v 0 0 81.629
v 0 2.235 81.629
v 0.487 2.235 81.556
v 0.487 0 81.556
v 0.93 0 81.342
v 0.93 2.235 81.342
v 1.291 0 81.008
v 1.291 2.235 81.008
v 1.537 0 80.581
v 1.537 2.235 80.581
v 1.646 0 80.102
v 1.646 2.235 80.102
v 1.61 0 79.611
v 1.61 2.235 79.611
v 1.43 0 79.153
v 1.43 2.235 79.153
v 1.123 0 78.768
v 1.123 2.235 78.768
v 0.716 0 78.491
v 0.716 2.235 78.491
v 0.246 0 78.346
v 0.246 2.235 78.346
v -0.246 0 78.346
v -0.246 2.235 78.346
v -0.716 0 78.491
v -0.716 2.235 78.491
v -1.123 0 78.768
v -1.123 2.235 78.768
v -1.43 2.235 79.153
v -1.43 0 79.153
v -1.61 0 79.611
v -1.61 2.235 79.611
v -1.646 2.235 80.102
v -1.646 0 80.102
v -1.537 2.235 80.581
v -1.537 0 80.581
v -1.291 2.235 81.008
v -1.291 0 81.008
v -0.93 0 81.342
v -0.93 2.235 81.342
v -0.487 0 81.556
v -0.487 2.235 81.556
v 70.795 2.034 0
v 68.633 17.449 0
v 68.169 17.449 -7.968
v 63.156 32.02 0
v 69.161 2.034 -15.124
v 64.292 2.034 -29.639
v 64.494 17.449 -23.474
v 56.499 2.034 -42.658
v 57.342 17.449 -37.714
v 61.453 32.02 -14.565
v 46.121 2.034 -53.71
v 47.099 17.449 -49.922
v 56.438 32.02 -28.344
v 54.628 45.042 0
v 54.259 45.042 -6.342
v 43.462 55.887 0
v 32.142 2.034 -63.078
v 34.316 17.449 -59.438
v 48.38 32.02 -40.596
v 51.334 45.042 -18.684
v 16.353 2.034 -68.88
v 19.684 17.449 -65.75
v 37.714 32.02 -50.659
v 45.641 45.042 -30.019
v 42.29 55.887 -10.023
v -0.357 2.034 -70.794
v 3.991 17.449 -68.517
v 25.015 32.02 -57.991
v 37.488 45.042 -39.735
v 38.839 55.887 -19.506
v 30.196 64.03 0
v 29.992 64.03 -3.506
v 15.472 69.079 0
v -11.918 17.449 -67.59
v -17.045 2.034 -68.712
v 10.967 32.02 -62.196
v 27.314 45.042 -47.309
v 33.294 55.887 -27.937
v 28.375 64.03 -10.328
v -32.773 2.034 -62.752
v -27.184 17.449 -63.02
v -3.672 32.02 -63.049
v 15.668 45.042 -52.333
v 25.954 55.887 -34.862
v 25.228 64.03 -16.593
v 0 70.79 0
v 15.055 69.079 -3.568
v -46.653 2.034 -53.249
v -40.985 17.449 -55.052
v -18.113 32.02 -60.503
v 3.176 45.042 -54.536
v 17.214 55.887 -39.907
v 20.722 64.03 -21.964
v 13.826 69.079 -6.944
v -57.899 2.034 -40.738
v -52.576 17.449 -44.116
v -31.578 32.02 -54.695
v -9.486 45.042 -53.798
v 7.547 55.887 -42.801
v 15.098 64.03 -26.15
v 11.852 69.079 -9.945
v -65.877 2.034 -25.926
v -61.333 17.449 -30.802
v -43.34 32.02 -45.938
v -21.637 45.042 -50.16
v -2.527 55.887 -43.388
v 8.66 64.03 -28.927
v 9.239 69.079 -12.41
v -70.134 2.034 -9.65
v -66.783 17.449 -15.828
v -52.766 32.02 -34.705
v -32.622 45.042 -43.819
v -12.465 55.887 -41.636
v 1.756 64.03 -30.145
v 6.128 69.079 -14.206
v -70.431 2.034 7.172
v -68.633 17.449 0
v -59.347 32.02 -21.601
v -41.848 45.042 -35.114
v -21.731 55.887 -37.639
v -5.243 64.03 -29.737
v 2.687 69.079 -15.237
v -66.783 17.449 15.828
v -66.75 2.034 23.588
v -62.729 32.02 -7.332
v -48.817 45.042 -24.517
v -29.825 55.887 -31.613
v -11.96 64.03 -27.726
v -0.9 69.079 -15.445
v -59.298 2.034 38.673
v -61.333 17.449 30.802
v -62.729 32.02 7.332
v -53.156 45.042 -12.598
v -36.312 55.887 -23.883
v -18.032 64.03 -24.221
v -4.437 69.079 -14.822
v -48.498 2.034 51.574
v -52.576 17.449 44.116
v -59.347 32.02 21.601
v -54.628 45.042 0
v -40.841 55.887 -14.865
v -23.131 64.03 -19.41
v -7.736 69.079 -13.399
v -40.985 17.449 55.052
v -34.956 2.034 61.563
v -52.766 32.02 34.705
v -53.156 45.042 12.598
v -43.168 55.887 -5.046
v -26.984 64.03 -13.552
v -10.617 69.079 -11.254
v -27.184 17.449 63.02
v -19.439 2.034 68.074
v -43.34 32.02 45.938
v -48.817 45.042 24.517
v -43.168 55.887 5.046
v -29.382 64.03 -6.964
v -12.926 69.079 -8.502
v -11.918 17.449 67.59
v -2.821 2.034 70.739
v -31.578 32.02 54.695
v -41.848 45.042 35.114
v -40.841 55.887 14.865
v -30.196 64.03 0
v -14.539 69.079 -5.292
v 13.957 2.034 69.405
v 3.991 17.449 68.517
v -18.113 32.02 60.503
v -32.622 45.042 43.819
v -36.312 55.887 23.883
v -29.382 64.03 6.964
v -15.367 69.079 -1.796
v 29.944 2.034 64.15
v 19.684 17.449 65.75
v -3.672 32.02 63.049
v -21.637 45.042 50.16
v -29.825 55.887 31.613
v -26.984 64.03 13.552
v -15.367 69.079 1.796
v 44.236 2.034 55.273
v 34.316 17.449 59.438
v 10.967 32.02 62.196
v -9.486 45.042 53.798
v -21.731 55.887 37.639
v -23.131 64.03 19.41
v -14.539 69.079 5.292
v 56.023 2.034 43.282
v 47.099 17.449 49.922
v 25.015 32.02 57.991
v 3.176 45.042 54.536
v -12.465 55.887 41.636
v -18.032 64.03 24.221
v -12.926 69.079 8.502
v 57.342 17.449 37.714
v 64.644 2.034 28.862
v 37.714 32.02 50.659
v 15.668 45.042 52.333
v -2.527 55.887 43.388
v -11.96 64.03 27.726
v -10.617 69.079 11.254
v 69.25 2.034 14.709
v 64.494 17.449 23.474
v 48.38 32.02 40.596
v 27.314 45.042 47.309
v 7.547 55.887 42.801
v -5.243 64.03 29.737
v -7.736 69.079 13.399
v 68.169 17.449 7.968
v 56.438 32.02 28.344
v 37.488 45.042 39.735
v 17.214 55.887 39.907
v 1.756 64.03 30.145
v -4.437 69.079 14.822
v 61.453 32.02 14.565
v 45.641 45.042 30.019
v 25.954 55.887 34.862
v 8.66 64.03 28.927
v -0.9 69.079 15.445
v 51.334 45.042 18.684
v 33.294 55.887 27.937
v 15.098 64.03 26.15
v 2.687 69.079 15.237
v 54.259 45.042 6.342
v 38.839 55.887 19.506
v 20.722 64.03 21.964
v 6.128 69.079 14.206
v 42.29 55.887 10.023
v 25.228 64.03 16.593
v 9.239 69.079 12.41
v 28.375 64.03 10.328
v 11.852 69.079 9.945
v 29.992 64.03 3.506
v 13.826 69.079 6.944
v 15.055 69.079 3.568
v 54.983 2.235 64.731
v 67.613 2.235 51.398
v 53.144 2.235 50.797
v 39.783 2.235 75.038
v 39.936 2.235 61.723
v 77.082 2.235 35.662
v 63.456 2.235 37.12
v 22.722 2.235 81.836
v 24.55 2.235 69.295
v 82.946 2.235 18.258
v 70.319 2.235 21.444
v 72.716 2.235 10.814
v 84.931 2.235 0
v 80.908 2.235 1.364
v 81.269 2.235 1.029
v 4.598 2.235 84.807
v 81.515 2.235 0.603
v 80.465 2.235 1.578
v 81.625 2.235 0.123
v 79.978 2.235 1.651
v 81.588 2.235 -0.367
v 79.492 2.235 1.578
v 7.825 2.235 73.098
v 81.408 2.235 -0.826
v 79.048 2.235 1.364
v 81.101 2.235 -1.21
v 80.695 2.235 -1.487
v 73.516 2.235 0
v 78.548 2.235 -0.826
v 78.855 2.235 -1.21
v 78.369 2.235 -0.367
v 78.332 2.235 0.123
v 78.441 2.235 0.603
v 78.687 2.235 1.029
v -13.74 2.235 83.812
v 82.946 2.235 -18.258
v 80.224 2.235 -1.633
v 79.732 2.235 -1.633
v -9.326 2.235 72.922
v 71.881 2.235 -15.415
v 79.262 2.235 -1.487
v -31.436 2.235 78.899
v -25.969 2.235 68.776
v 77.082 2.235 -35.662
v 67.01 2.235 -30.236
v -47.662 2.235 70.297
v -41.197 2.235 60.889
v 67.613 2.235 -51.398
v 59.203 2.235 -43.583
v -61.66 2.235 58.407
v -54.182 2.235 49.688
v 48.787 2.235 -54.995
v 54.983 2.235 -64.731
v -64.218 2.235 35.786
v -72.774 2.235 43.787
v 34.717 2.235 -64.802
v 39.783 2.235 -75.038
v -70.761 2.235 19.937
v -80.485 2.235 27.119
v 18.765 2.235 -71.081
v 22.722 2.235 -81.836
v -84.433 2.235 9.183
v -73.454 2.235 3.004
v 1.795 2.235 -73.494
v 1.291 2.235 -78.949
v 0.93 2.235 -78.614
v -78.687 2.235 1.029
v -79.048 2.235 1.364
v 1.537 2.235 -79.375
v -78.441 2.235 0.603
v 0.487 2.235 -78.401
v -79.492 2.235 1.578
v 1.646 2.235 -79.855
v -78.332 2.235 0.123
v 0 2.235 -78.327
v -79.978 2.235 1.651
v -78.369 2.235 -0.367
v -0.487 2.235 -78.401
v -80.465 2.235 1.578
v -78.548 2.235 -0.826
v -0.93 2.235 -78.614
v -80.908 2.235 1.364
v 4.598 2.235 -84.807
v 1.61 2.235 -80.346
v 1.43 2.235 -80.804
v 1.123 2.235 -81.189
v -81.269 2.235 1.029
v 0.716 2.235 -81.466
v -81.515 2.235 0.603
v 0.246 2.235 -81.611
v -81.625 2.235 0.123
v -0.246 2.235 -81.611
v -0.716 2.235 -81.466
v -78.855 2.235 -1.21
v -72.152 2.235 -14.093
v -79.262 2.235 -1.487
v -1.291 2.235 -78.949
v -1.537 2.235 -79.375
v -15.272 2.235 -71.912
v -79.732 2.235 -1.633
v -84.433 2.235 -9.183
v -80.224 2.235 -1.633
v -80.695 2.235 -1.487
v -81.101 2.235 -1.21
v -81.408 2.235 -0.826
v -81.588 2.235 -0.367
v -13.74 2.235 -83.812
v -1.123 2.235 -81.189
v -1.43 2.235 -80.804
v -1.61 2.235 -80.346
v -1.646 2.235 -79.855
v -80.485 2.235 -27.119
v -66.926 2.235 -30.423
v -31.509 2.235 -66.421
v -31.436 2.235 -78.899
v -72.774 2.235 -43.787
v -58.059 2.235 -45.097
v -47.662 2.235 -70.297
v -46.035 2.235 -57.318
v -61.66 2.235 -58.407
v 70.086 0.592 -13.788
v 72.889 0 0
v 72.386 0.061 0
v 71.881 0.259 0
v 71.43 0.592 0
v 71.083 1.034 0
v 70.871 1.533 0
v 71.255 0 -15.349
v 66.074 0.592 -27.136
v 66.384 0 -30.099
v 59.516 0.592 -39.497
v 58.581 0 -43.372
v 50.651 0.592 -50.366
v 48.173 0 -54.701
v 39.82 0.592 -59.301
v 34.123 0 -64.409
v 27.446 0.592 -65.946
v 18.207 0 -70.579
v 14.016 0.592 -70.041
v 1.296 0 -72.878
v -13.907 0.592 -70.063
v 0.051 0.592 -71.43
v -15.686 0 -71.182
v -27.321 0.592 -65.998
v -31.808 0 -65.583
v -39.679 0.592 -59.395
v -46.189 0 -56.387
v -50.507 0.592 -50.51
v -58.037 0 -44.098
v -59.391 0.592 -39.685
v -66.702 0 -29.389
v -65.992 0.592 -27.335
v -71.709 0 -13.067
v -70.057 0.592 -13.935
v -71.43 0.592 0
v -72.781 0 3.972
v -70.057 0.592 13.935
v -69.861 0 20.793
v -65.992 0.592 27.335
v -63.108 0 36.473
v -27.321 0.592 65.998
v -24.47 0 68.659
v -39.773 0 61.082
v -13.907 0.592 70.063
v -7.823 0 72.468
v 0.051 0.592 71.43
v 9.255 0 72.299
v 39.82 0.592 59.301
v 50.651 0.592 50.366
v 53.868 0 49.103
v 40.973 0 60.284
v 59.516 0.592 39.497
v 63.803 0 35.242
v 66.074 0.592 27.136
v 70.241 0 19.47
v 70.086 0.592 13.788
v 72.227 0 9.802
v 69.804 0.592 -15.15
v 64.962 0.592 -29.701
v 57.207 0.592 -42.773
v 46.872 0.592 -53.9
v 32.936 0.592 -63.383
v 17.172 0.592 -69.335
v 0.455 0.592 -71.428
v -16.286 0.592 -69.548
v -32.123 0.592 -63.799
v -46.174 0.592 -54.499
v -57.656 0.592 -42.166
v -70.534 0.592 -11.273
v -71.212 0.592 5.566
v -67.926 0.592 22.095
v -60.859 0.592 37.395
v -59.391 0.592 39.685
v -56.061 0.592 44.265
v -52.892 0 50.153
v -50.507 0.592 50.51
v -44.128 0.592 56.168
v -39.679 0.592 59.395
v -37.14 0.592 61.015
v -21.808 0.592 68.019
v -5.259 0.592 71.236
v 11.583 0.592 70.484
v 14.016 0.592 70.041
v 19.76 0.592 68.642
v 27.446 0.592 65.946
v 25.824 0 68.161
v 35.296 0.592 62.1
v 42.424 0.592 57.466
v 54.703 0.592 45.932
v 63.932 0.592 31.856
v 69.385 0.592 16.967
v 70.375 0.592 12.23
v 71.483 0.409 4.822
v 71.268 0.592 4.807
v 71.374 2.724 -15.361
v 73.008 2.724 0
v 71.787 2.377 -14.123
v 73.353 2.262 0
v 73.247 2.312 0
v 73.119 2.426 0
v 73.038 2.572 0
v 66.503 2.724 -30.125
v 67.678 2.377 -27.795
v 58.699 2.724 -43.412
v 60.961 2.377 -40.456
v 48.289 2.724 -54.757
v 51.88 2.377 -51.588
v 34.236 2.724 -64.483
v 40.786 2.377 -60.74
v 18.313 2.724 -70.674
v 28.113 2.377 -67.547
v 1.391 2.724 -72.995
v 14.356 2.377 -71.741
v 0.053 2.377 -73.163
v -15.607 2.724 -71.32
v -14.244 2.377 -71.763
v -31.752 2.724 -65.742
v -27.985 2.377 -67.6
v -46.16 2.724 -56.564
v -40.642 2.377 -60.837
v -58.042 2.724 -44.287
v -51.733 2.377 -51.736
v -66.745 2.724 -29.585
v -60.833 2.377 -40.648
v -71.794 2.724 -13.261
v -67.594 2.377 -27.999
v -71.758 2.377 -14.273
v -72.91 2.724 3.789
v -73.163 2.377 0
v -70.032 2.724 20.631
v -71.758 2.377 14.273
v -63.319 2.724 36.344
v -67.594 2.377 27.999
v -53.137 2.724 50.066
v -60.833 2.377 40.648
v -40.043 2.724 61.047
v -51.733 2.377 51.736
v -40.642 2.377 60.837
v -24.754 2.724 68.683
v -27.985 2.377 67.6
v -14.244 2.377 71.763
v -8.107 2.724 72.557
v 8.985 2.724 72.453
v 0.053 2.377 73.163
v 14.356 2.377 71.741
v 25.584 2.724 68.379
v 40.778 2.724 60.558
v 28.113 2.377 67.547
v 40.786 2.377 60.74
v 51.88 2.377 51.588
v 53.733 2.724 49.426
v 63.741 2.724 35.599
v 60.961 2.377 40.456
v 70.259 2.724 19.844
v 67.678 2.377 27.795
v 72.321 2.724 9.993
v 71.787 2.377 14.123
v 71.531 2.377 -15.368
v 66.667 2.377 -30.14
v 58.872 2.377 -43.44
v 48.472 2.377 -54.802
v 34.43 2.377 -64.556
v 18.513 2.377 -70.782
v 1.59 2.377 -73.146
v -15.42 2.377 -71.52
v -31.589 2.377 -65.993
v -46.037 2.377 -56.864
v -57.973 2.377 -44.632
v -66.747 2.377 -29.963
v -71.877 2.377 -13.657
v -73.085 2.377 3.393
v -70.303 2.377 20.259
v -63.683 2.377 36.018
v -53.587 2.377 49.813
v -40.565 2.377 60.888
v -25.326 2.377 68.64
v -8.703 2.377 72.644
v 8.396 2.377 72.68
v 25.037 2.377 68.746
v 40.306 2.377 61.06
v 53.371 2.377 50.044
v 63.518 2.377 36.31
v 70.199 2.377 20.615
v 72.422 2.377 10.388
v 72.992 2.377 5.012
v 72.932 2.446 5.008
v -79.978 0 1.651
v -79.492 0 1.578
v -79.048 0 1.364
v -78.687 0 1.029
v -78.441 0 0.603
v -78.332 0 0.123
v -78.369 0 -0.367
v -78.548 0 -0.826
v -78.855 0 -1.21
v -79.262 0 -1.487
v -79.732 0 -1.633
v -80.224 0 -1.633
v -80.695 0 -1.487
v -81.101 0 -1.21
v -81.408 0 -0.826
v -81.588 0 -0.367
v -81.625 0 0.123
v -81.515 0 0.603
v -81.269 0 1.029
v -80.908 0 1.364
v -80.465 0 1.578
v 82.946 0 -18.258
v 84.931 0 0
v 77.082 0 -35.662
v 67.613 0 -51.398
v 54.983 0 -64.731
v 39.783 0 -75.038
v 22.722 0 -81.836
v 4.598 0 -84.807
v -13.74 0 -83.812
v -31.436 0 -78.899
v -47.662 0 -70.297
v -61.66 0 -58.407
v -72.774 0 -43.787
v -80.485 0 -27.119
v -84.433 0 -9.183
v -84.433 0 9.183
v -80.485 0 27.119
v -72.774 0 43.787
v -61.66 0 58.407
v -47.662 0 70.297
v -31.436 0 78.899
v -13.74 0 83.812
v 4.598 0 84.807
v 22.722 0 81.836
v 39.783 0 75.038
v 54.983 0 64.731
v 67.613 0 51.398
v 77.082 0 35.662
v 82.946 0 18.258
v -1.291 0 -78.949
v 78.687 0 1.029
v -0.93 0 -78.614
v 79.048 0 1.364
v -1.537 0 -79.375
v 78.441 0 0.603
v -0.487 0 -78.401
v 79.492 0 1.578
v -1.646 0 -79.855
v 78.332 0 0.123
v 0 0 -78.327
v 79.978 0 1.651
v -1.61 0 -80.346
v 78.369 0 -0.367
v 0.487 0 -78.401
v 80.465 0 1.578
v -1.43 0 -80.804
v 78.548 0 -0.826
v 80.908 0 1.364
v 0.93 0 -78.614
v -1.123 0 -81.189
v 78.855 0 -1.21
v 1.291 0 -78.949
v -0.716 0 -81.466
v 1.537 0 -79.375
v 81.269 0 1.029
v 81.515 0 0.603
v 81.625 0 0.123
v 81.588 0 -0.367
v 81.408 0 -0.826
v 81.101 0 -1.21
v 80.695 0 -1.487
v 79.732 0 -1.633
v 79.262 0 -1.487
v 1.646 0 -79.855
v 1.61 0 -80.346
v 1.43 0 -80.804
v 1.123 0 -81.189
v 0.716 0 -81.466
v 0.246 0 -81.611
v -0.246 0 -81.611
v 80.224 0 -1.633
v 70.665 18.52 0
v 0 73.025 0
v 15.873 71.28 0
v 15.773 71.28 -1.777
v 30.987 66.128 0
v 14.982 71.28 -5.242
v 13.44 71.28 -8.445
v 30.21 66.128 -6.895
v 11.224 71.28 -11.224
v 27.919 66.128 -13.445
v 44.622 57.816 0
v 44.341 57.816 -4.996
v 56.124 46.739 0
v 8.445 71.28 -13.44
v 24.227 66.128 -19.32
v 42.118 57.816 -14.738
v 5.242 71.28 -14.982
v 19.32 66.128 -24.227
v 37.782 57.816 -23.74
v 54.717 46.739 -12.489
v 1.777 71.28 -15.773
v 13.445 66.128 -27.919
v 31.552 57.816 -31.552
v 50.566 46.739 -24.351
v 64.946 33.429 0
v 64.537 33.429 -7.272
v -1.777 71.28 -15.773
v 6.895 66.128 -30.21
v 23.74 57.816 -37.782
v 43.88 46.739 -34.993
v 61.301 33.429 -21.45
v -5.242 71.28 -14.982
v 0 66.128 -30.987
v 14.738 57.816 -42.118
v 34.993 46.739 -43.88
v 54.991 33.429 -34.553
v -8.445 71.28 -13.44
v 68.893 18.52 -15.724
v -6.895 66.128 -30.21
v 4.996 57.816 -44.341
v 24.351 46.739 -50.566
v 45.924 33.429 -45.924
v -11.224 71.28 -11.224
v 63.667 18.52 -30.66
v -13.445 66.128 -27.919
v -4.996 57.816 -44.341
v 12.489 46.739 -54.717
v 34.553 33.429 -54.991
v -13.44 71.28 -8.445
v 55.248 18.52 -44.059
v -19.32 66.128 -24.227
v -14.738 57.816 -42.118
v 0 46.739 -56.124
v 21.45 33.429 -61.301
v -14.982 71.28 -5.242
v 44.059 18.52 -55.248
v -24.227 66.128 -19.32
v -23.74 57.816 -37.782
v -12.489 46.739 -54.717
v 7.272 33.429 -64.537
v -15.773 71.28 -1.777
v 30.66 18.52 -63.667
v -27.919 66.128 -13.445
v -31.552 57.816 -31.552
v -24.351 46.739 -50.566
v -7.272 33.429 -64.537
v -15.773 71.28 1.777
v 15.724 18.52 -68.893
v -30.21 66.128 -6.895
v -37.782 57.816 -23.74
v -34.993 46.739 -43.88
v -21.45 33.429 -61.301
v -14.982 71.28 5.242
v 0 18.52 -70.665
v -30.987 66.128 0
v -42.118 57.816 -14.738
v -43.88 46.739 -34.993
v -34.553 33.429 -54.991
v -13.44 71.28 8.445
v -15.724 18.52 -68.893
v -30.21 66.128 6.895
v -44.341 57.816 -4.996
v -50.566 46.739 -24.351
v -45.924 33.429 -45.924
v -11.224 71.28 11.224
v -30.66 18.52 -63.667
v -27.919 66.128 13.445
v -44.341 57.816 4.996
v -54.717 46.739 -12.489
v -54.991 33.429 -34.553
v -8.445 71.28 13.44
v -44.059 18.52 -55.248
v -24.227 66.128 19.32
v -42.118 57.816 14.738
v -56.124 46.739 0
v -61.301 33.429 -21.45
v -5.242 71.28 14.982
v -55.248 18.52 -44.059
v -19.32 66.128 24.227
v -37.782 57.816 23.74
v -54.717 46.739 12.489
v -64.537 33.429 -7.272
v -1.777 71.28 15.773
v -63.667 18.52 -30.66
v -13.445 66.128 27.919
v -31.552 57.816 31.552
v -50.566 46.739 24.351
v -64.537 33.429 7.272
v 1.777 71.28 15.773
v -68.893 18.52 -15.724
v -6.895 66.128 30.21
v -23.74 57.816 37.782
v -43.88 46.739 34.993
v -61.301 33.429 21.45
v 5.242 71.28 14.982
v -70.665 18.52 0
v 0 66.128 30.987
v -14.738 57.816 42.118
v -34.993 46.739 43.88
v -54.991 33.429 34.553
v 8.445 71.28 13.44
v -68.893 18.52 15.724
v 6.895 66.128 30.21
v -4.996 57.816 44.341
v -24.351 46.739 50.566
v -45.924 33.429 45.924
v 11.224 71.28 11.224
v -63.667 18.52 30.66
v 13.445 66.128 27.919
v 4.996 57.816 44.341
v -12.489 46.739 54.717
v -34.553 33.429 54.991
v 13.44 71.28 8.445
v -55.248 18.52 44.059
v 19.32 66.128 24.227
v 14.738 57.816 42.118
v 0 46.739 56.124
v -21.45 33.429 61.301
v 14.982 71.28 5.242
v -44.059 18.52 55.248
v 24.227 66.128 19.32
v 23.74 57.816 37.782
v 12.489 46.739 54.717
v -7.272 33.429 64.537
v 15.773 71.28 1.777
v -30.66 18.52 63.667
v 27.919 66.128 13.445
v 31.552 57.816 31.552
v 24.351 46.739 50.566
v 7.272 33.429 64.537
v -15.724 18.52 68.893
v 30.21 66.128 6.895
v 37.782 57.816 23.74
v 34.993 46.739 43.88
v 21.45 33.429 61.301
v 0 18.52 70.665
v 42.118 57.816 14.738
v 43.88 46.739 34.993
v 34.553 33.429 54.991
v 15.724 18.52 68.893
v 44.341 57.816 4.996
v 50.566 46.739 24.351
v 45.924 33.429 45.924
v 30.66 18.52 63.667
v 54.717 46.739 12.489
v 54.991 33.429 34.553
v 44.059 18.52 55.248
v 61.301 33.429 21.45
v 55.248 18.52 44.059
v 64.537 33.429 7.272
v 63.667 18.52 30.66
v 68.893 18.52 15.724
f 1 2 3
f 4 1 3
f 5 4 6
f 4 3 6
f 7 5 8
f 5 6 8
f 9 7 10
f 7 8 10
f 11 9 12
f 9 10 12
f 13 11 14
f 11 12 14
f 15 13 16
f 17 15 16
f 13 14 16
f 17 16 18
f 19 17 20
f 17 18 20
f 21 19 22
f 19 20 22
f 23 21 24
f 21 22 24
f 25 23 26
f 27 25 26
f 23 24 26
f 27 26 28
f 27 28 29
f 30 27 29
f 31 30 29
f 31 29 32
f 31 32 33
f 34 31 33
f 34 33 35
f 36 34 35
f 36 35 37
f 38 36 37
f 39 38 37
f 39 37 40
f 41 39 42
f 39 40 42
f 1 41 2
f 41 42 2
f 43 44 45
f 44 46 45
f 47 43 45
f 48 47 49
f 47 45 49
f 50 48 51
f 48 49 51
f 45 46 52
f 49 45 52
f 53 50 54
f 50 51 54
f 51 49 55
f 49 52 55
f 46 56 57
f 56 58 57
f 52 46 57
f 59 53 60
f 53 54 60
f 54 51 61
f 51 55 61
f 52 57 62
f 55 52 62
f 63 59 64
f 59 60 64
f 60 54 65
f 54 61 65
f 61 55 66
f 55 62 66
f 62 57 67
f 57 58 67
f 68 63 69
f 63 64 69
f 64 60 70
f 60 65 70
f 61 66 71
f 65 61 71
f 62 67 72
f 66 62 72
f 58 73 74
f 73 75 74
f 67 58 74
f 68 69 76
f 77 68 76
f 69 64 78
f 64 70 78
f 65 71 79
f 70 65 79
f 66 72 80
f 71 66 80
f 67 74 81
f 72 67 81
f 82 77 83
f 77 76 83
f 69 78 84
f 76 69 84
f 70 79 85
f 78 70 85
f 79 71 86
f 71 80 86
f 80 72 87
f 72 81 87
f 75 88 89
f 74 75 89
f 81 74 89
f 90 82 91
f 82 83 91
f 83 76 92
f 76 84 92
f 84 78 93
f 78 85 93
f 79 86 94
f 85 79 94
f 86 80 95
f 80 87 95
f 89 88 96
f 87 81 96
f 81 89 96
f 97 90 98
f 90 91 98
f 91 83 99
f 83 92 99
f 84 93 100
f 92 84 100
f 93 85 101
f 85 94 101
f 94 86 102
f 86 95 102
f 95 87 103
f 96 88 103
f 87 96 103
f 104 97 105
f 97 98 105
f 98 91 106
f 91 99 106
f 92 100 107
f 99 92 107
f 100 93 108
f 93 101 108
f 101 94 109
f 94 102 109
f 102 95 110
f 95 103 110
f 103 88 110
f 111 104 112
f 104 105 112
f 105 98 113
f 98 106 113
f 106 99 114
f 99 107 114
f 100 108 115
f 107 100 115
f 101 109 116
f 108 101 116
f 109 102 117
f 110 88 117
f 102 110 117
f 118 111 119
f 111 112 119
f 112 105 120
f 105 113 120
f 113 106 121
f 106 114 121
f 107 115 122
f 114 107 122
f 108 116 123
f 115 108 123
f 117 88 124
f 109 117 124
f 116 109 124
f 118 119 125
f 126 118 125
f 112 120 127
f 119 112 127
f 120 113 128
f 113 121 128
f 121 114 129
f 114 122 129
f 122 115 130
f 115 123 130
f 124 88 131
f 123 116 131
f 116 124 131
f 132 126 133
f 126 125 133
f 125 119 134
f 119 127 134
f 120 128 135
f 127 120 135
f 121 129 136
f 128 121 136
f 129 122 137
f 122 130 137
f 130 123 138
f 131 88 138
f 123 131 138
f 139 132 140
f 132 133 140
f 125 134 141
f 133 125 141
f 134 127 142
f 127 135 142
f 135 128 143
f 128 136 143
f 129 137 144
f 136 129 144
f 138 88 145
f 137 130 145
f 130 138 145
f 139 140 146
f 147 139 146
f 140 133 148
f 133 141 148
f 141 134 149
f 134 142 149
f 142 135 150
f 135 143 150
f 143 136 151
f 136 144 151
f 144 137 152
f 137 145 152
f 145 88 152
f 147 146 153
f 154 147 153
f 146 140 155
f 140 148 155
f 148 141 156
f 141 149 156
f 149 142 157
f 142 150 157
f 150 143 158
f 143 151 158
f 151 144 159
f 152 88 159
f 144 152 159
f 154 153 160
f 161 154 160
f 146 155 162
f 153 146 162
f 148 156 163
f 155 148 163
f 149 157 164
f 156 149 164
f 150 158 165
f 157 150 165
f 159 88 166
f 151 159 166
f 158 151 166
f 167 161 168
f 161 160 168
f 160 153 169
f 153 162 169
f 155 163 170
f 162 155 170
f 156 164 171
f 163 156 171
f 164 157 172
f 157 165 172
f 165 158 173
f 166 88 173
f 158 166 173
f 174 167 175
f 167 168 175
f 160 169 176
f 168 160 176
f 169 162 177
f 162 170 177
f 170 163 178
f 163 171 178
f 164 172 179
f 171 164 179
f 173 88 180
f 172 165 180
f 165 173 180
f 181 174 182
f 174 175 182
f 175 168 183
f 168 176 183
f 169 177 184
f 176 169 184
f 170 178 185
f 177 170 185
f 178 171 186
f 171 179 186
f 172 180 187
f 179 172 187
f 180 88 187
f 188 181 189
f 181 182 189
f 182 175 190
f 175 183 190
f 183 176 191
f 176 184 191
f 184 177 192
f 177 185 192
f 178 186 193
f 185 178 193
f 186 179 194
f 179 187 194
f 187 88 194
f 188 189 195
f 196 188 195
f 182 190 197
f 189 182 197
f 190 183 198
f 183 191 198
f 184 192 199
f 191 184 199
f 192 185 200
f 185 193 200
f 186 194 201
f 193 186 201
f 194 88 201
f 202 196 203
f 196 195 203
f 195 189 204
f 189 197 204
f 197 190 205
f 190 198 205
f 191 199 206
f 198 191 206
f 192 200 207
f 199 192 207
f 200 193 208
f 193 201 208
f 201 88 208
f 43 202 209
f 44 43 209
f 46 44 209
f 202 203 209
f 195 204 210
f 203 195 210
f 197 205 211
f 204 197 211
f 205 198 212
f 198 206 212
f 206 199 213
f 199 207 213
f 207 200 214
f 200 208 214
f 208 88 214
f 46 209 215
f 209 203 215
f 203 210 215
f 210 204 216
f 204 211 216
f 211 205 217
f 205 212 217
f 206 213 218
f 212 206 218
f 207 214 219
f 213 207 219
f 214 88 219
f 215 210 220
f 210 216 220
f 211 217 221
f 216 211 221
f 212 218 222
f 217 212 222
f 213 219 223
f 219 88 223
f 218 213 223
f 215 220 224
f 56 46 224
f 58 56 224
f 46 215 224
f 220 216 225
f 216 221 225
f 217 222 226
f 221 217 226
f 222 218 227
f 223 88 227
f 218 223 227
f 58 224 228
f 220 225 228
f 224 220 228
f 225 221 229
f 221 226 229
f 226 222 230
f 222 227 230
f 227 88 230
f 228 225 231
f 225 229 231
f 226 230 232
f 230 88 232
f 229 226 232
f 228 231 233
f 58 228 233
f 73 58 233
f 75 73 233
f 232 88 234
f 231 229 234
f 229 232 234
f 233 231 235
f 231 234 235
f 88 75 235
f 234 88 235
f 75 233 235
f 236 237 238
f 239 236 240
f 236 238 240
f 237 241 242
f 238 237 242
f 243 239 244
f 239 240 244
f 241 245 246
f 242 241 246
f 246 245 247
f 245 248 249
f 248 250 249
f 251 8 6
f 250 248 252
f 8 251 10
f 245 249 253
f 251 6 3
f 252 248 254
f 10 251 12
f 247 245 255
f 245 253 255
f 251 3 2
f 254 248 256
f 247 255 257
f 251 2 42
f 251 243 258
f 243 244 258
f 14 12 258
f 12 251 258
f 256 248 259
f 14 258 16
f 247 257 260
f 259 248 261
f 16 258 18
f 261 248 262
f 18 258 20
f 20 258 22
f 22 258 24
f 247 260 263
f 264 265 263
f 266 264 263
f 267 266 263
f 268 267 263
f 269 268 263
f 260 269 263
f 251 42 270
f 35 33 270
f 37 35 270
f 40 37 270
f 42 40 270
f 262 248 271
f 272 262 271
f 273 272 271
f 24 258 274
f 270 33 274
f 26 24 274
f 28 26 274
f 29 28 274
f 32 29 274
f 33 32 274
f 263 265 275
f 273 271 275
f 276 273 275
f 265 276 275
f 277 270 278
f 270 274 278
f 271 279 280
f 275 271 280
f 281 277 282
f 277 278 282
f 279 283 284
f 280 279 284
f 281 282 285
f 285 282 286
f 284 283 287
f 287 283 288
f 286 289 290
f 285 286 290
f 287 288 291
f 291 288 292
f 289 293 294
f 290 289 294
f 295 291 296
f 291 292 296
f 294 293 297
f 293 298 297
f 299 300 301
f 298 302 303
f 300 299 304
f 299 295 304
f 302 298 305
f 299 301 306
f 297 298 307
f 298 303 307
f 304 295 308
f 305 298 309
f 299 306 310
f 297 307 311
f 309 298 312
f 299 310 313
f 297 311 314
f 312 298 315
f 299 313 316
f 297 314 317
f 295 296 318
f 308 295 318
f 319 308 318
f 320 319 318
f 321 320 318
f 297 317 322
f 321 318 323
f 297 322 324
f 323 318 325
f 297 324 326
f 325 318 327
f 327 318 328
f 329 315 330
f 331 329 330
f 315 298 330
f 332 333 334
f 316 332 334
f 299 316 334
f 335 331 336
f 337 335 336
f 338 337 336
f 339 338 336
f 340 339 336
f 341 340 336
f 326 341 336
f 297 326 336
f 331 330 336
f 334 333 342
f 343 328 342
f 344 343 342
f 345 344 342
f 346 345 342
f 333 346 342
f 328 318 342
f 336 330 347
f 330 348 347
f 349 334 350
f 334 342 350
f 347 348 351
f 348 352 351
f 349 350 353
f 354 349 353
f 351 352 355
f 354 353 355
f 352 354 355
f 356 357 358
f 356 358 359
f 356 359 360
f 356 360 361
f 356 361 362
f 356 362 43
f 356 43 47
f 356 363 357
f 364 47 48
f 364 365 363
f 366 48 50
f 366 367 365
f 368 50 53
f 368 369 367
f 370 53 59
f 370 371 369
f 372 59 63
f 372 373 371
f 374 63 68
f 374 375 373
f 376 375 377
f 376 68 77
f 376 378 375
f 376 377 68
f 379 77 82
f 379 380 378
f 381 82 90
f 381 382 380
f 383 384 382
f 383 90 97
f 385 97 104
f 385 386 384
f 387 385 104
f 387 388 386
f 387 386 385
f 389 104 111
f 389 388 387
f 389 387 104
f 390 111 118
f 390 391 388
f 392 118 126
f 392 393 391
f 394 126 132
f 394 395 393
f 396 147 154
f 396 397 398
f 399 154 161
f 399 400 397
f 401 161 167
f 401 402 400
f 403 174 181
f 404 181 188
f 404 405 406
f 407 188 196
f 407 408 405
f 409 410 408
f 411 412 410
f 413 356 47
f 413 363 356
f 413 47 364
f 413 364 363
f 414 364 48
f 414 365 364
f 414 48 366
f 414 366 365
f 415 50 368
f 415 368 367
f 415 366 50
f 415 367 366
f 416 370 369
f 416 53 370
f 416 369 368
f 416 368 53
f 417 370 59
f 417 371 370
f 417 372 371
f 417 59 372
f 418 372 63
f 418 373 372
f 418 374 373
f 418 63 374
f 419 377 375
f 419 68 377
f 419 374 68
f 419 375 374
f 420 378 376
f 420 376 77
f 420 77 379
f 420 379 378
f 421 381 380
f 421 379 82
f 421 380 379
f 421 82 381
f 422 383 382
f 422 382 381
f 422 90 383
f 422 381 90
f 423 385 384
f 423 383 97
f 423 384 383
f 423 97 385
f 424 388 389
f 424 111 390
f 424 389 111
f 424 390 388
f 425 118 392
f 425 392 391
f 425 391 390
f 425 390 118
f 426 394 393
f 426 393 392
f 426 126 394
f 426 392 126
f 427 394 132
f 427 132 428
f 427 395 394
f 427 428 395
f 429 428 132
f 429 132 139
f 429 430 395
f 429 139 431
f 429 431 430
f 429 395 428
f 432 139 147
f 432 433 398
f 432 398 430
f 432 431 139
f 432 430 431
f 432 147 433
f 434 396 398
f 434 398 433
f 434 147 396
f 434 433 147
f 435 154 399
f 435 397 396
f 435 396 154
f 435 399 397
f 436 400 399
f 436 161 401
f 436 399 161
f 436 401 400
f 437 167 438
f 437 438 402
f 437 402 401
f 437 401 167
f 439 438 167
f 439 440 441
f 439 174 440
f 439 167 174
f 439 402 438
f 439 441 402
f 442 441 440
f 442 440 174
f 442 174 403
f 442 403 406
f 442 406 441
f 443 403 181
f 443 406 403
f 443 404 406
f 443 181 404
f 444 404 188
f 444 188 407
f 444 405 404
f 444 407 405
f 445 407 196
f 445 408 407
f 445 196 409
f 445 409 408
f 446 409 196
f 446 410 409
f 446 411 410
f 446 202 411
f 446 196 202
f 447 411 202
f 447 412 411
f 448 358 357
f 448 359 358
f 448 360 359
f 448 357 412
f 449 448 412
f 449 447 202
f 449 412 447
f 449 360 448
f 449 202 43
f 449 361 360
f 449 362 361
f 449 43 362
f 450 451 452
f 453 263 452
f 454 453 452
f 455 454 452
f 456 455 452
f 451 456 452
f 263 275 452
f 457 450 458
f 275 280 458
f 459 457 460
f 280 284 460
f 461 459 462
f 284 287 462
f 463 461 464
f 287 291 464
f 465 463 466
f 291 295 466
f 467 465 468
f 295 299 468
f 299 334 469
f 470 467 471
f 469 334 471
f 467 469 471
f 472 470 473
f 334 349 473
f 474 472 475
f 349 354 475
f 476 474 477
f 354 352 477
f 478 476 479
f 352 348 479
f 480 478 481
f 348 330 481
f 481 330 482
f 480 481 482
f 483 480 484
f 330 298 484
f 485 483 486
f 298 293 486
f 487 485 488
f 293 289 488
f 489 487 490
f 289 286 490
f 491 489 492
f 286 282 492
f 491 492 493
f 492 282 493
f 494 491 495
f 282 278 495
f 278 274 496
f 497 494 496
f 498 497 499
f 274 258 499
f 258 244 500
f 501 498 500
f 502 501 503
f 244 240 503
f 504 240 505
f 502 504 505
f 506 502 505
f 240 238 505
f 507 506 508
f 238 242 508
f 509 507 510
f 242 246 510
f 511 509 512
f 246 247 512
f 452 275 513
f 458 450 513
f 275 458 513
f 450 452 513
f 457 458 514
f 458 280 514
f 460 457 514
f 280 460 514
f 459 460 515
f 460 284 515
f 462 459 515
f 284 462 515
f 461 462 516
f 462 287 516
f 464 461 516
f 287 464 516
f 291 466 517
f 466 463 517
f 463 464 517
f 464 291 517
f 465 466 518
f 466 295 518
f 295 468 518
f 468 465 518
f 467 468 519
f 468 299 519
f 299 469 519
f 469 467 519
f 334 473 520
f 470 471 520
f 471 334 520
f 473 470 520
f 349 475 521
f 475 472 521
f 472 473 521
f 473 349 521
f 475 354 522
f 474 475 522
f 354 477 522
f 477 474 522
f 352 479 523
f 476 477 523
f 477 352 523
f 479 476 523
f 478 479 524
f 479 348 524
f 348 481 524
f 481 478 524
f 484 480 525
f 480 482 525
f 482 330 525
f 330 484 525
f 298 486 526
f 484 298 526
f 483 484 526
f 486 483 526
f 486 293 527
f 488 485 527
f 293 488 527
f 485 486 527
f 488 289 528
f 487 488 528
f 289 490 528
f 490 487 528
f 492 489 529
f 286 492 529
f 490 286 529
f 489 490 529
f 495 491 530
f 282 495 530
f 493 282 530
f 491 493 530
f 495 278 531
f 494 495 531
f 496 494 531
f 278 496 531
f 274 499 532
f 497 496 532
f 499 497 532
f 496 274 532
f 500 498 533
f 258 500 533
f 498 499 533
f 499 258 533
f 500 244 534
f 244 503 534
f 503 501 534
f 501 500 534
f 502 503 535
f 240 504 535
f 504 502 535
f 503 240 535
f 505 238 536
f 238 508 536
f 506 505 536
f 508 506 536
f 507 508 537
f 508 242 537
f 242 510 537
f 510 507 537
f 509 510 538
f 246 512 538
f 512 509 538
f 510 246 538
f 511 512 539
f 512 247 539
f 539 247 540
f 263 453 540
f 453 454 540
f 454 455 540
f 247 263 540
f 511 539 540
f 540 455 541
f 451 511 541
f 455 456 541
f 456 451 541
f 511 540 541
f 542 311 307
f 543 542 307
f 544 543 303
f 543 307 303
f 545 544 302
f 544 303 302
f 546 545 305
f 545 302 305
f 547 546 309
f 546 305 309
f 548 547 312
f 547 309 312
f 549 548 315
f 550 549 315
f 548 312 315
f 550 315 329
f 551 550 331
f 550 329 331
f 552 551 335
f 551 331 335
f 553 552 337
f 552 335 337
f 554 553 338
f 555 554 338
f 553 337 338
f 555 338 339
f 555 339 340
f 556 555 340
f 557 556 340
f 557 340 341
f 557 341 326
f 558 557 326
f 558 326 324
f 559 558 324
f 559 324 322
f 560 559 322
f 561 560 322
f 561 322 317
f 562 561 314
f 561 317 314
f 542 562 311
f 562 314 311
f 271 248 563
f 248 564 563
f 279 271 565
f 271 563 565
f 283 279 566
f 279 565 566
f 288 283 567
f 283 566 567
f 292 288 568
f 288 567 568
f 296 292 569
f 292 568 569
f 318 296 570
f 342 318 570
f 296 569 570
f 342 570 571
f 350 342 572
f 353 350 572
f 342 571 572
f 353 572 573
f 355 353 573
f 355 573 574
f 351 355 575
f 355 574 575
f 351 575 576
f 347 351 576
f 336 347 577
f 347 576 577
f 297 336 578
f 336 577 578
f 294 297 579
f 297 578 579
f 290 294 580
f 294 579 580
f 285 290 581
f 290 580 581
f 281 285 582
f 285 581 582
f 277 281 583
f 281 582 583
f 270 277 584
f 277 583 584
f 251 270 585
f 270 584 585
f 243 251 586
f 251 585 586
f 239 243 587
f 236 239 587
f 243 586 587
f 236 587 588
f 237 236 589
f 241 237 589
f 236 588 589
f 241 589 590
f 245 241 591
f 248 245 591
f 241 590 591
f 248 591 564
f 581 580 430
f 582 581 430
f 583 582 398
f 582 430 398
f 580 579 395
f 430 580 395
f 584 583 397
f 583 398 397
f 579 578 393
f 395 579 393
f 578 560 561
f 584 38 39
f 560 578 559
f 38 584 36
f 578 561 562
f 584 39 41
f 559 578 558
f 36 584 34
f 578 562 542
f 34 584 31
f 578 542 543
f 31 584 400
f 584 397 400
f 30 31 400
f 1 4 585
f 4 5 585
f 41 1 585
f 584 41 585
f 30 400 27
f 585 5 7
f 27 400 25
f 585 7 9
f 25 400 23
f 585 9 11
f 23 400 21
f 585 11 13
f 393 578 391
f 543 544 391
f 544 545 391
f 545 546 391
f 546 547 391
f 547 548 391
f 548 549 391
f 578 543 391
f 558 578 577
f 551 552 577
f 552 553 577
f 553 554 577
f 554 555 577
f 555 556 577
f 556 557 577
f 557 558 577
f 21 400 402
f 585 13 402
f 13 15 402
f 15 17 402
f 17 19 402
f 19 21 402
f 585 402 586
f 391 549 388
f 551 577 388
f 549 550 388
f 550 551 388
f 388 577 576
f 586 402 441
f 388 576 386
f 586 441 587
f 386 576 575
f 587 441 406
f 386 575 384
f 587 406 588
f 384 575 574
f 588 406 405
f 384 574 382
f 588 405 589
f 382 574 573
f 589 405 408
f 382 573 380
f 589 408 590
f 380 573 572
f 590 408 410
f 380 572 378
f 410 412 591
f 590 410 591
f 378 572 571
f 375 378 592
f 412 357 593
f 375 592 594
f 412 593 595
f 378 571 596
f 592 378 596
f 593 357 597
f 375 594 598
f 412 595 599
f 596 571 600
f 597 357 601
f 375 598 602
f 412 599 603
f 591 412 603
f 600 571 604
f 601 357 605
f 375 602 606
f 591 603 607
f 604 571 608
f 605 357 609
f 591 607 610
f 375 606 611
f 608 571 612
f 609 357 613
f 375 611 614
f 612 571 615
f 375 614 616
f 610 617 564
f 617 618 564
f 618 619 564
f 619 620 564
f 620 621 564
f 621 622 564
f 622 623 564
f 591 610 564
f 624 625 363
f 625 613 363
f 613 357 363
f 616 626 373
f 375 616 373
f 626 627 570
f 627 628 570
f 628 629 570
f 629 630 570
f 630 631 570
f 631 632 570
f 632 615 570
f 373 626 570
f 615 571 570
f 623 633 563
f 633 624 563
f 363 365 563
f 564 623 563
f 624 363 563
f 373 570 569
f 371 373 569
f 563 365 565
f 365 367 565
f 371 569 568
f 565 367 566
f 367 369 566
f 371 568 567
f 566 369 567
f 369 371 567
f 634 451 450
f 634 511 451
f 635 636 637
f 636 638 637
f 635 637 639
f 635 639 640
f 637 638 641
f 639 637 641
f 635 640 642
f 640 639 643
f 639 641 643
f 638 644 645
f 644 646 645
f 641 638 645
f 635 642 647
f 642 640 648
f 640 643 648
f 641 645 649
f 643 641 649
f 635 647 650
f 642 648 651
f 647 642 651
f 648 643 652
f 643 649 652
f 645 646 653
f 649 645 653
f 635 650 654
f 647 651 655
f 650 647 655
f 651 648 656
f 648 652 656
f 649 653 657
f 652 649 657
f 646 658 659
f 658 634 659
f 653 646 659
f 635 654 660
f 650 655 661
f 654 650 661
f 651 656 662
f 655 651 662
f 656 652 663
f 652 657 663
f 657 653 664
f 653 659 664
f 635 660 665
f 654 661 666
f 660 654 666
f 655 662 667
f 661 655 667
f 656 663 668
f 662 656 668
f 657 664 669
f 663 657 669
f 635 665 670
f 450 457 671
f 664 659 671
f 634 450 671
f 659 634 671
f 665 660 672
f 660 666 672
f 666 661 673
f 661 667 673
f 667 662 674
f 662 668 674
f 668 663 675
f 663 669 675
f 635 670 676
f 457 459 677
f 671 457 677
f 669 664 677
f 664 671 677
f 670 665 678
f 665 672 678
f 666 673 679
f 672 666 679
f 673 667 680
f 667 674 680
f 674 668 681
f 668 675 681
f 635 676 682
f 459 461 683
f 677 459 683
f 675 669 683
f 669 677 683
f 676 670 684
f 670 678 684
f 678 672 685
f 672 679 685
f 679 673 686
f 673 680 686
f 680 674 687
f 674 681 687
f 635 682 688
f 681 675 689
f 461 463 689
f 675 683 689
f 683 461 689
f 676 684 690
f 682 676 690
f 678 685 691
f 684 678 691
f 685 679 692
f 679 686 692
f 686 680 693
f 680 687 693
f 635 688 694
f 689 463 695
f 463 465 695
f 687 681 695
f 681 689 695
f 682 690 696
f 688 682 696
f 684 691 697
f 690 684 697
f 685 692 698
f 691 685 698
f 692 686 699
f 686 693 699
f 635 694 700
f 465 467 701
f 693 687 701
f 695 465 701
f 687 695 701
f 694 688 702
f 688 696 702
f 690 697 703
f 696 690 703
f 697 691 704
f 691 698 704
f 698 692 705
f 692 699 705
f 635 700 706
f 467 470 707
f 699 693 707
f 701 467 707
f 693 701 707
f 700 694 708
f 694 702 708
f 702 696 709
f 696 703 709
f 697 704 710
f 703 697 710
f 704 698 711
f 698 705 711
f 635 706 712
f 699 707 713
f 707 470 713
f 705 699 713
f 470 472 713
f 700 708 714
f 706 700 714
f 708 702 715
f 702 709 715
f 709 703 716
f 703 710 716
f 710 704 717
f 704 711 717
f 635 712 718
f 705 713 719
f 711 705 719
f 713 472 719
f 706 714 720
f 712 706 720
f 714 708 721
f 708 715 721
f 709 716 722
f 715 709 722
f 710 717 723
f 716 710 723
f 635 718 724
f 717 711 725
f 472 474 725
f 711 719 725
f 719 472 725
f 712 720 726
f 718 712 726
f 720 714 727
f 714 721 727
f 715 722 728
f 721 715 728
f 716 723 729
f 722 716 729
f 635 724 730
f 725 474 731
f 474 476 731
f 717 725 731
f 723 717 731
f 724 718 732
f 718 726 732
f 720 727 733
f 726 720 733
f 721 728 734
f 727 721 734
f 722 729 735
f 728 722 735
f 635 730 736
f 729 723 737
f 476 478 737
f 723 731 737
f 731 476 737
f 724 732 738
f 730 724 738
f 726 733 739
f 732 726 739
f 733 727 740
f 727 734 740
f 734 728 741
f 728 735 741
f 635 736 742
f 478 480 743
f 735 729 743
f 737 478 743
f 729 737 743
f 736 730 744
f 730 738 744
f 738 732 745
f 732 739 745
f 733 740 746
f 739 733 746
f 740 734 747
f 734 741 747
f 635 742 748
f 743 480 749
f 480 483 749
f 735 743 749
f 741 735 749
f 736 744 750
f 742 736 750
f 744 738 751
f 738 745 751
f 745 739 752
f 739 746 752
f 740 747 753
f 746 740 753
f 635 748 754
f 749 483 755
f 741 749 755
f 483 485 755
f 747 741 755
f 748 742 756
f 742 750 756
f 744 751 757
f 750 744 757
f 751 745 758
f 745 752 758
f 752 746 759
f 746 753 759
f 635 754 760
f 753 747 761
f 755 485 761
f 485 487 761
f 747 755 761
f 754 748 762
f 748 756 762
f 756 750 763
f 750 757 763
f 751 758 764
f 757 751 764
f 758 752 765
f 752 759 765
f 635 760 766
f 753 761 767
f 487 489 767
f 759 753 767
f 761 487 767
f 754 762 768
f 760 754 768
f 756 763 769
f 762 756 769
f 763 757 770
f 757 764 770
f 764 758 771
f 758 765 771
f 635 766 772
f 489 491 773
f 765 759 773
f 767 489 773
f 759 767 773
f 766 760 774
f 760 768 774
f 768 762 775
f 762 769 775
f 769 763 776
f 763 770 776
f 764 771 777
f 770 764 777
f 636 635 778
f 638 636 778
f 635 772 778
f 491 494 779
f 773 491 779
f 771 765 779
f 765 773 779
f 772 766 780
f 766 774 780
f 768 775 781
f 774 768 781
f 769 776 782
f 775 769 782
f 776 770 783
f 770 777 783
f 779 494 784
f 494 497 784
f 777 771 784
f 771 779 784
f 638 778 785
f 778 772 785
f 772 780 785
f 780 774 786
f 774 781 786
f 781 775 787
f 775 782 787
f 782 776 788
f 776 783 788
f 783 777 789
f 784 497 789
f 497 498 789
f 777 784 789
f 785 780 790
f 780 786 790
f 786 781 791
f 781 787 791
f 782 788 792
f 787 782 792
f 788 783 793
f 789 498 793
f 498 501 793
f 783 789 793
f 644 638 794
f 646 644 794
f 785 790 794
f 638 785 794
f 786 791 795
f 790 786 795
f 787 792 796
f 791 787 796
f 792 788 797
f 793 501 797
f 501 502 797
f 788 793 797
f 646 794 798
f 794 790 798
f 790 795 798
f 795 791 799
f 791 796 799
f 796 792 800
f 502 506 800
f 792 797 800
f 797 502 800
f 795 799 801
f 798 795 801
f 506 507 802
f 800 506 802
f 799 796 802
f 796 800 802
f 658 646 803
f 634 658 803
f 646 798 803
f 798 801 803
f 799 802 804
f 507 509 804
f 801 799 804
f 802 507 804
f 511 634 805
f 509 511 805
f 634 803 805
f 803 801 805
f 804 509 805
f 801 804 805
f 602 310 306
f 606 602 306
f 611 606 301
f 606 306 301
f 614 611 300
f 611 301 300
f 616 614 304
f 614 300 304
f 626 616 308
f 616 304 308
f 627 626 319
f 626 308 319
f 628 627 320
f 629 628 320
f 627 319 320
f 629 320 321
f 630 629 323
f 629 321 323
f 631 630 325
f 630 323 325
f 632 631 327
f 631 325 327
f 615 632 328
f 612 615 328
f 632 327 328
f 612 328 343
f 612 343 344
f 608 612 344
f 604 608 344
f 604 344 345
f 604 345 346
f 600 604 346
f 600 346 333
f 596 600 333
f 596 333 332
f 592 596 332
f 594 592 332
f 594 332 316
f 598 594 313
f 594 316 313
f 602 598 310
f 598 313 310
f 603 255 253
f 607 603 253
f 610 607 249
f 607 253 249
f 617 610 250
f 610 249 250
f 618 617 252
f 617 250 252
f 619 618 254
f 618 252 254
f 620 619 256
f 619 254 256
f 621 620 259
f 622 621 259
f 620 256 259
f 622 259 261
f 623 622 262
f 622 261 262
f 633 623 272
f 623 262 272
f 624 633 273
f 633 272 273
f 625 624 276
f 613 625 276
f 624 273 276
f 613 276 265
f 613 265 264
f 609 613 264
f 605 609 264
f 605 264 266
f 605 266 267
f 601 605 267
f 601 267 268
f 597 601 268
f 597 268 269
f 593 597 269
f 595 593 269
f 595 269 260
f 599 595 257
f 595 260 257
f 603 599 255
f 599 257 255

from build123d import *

# Parameters (mm, degrees)
SKETCH2_R        = 1.651
DOME_HOLES_DEPTH = 2.2352
FILLET1_R        = 2.0955
FILLET2_R        = 0.508


# Read off the part's stored shape, not the designer's step: Shell1
with BuildPart() as part:
    # Sketch1 → Revolve1 (revolve)
    with BuildSketch(Plane.XY):
        with BuildLine():
            Line((0, 0), (0, 73.025))
            ThreePointArc((0, 73.025), (50.852351, 52.42273424), (73.025, 2.2352))
            Line((73.025, 2.2352), (84.93125, 2.2352))
            Line((84.93125, 2.2352), (84.93125, 0))
            Line((84.93125, 0), (0, 0))
        make_face()
    revolve(axis=Axis((0, 0, 0), (0, 1, 0)))

    # Shell1 outline → Shell1 (revolve, cut)
    with BuildSketch(Plane.XY):
        with BuildLine():
            Line((0, -7.1e-08), (70.825079619, -7.1e-08))
            ThreePointArc((70.825079619, -7.1e-08), (50.068422427, 50.058086641), (0, 70.7898))
            Line((0, 70.7898), (0, -7.1e-08))
        make_face()
    revolve(axis=Axis((0, 0, 0), (0, 1, 0)), mode=Mode.SUBTRACT)

    # Sketch2 → Dome Holes (cut)
    with BuildSketch(Plane(origin=(0, 2.2352, 0), x_dir=(1, 0, 0), z_dir=(0, 1, 0))):
        with Locations(Location((0, 79.97825, 0), (0, 0, 270))):
            Circle(SKETCH2_R)
        with Locations(Location((79.97825, 0, 0), (0, 0, 270))):
            Circle(SKETCH2_R)
        with Locations(Location((0, -79.97825, 0), (0, 0, 270))):
            Circle(SKETCH2_R)
        with Locations(Location((-79.97825, 0, 0), (0, 0, 270))):
            Circle(SKETCH2_R)
    extrude(amount=-DOME_HOLES_DEPTH, mode=Mode.SUBTRACT)

    # Fillet1
    fillet1_edges = [part.edges().sort_by_distance(p)[0] for p in [
        (-70.825079619, -7.1e-08, 0),
    ]]
    fillet(fillet1_edges, radius=FILLET1_R)

    # Fillet2
    fillet2_edges = [part.edges().sort_by_distance(p)[0] for p in [
        (-73.025, 2.2352, 0),
    ]]
    fillet(fillet2_edges, radius=FILLET2_R)


solid = part.part
